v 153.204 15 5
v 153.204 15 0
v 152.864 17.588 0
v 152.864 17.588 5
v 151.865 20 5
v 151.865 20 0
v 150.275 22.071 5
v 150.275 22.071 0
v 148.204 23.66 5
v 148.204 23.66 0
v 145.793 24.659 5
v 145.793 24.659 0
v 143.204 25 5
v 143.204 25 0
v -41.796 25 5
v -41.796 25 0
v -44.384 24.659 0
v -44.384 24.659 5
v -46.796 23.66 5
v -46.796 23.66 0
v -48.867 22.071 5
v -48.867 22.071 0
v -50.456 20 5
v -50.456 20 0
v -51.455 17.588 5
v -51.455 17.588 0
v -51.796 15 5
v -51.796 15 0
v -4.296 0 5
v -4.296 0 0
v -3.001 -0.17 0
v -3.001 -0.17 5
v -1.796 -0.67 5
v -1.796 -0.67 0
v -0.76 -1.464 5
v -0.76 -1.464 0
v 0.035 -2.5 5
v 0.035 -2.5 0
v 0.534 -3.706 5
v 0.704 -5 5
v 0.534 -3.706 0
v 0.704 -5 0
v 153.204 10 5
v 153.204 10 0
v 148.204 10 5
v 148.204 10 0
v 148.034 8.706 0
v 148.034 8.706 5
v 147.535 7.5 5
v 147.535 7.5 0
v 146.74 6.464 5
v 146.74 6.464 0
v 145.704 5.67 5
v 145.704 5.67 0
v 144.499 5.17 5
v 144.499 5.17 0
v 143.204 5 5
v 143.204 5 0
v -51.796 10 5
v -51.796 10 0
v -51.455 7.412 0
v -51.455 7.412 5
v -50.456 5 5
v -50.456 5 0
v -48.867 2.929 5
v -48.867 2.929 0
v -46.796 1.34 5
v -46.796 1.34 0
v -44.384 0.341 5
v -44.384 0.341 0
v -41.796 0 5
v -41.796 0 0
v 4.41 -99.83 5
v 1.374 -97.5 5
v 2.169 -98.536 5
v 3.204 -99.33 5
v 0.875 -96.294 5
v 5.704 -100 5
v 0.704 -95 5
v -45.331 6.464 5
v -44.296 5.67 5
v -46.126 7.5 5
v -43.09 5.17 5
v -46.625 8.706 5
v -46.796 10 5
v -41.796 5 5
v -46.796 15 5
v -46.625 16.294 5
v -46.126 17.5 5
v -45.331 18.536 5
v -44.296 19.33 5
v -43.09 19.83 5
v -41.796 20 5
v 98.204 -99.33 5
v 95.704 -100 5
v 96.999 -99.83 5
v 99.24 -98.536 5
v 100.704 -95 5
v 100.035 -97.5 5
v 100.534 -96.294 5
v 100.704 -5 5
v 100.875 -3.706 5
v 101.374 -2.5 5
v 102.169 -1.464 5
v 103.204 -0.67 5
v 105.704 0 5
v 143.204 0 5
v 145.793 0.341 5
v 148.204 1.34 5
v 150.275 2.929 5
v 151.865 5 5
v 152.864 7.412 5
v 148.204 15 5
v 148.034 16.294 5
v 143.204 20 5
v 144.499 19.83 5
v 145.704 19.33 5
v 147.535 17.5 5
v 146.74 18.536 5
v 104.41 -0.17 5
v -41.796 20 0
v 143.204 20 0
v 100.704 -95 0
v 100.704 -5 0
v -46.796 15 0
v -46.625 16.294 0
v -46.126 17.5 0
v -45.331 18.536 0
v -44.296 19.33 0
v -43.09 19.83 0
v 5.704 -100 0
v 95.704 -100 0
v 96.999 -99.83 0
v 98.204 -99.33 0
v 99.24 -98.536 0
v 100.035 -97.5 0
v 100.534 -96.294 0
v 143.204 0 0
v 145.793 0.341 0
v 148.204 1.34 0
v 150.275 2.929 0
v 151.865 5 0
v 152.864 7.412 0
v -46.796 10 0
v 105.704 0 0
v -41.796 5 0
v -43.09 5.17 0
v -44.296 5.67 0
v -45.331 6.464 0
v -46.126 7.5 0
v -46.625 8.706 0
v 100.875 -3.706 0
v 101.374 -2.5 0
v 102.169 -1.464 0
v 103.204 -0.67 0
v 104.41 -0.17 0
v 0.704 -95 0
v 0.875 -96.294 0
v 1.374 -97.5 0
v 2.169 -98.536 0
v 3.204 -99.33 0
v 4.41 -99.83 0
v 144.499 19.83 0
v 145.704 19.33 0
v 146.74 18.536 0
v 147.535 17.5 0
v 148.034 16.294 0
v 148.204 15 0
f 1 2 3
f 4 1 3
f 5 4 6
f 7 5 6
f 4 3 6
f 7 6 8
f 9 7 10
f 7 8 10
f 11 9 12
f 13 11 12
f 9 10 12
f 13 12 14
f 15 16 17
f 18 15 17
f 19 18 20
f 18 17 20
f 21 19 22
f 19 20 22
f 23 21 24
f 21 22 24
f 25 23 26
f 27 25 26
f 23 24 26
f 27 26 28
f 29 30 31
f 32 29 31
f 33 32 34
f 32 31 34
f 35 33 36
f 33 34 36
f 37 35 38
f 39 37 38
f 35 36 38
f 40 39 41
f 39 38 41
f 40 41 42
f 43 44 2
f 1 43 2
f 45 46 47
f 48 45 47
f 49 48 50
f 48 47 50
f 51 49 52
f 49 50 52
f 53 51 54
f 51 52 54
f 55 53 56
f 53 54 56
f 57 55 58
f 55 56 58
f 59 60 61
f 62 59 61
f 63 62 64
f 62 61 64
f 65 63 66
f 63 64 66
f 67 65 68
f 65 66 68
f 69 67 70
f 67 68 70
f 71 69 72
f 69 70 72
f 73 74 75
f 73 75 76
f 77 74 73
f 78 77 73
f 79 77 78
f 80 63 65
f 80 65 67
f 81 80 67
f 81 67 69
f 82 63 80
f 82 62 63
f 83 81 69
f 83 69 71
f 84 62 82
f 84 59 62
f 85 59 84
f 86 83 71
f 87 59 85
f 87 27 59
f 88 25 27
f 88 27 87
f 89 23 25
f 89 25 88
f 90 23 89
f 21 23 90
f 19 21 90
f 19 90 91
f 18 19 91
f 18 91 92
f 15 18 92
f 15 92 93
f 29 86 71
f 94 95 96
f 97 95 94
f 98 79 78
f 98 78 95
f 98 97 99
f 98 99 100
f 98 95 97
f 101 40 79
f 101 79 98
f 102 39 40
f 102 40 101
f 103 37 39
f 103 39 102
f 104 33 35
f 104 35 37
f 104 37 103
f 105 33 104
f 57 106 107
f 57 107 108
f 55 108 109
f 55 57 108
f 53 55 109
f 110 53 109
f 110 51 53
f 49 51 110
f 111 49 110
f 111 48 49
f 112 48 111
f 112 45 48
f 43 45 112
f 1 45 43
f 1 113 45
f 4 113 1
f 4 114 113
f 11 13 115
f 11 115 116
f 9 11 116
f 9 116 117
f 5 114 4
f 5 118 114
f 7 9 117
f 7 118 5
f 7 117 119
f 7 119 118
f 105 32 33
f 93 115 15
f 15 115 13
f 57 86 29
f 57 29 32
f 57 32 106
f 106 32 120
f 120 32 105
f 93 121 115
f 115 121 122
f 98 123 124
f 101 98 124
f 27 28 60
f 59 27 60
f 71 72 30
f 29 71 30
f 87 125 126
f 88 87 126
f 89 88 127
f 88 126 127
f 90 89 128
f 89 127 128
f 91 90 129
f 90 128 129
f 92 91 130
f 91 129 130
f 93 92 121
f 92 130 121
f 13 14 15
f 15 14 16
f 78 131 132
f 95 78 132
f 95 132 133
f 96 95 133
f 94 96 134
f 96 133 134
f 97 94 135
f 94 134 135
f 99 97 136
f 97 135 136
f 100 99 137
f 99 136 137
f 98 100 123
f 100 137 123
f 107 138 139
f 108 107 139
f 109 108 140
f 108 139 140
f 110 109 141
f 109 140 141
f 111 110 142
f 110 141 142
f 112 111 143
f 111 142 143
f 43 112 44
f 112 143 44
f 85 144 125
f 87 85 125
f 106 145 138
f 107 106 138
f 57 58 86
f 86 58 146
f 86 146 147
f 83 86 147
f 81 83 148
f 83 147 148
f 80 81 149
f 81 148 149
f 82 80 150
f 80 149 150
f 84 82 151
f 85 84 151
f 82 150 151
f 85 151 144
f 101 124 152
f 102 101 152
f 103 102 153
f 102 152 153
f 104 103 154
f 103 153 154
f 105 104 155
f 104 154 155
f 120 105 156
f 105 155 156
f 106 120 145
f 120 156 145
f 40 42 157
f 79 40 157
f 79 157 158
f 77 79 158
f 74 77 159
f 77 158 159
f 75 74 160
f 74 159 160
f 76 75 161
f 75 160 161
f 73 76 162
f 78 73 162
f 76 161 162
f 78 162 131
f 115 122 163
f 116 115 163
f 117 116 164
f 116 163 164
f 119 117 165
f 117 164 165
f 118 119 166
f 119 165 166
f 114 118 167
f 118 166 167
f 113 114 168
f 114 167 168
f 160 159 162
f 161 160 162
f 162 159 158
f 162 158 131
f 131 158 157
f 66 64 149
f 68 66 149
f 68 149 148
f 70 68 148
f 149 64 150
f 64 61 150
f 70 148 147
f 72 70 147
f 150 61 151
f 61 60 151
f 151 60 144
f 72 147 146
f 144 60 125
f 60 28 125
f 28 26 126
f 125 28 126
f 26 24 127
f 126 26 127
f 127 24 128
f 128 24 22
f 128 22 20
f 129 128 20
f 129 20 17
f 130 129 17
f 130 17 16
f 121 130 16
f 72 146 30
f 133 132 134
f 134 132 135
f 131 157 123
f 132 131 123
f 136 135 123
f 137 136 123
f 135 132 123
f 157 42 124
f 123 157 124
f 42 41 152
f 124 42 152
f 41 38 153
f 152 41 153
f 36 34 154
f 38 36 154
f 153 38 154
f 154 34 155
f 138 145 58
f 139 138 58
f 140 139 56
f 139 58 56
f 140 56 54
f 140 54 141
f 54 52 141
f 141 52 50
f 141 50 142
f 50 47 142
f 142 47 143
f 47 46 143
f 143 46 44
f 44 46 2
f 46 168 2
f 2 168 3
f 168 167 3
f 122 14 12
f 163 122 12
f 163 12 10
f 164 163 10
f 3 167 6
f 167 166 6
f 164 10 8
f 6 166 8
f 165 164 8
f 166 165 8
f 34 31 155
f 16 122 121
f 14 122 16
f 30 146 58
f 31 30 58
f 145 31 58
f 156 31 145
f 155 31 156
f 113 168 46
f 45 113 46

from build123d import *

# Parameters (mm, degrees)
BOSS_EXTRUDE1_DEPTH = 5


with BuildPart() as part:
    # Sketch1 → Boss-Extrude1 (new body)
    with BuildSketch(Plane.XY):
        with BuildLine():
            Line((105.70441989, 0), (143.20441989, 0))
            ThreePointArc((143.20441989, 0), (150.275487701, 2.928932188), (153.20441989, 10))
            Line((153.20441989, 10), (153.20441989, 15))
            ThreePointArc((153.20441989, 15), (150.275487701, 22.071067812), (143.20441989, 25))
            Line((143.20441989, 25), (-41.79558011, 25))
            ThreePointArc((-41.79558011, 25), (-48.866647922, 22.071067812), (-51.79558011, 15))
            Line((-51.79558011, 15), (-51.79558011, 10))
            ThreePointArc((-51.79558011, 10), (-48.866647922, 2.928932188), (-41.79558011, 0))
            Line((-41.79558011, 0), (-4.29558011, 0))
            ThreePointArc((-4.29558011, 0), (-0.760046205, -1.464466094), (0.70441989, -5))
            Line((0.70441989, -5), (0.70441989, -95))
            ThreePointArc((0.70441989, -95), (2.168885984, -98.535533906), (5.70441989, -100))
            Line((5.70441989, -100), (95.70441989, -100))
            ThreePointArc((95.70441989, -100), (99.239953795, -98.535533906), (100.70441989, -95))
            Line((100.70441989, -95), (100.70441989, -5))
            ThreePointArc((100.70441989, -5), (102.168885984, -1.464466094), (105.70441989, 0))
        make_face()
        with BuildLine():
            Line((-41.79558011, 20), (143.20441989, 20))
            ThreePointArc((143.20441989, 20), (146.739953795, 18.535533906), (148.20441989, 15))
            Line((148.20441989, 15), (148.20441989, 10))
            ThreePointArc((148.20441989, 10), (146.739953795, 6.464466094), (143.20441989, 5))
            Line((143.20441989, 5), (-41.79558011, 5))
            ThreePointArc((-41.79558011, 5), (-45.331114016, 6.464466094), (-46.79558011, 10))
            Line((-46.79558011, 10), (-46.79558011, 15))
            ThreePointArc((-46.79558011, 15), (-45.331114016, 18.535533906), (-41.79558011, 20))
        make_face(mode=Mode.SUBTRACT)
    extrude(amount=BOSS_EXTRUDE1_DEPTH)


solid = part.part
